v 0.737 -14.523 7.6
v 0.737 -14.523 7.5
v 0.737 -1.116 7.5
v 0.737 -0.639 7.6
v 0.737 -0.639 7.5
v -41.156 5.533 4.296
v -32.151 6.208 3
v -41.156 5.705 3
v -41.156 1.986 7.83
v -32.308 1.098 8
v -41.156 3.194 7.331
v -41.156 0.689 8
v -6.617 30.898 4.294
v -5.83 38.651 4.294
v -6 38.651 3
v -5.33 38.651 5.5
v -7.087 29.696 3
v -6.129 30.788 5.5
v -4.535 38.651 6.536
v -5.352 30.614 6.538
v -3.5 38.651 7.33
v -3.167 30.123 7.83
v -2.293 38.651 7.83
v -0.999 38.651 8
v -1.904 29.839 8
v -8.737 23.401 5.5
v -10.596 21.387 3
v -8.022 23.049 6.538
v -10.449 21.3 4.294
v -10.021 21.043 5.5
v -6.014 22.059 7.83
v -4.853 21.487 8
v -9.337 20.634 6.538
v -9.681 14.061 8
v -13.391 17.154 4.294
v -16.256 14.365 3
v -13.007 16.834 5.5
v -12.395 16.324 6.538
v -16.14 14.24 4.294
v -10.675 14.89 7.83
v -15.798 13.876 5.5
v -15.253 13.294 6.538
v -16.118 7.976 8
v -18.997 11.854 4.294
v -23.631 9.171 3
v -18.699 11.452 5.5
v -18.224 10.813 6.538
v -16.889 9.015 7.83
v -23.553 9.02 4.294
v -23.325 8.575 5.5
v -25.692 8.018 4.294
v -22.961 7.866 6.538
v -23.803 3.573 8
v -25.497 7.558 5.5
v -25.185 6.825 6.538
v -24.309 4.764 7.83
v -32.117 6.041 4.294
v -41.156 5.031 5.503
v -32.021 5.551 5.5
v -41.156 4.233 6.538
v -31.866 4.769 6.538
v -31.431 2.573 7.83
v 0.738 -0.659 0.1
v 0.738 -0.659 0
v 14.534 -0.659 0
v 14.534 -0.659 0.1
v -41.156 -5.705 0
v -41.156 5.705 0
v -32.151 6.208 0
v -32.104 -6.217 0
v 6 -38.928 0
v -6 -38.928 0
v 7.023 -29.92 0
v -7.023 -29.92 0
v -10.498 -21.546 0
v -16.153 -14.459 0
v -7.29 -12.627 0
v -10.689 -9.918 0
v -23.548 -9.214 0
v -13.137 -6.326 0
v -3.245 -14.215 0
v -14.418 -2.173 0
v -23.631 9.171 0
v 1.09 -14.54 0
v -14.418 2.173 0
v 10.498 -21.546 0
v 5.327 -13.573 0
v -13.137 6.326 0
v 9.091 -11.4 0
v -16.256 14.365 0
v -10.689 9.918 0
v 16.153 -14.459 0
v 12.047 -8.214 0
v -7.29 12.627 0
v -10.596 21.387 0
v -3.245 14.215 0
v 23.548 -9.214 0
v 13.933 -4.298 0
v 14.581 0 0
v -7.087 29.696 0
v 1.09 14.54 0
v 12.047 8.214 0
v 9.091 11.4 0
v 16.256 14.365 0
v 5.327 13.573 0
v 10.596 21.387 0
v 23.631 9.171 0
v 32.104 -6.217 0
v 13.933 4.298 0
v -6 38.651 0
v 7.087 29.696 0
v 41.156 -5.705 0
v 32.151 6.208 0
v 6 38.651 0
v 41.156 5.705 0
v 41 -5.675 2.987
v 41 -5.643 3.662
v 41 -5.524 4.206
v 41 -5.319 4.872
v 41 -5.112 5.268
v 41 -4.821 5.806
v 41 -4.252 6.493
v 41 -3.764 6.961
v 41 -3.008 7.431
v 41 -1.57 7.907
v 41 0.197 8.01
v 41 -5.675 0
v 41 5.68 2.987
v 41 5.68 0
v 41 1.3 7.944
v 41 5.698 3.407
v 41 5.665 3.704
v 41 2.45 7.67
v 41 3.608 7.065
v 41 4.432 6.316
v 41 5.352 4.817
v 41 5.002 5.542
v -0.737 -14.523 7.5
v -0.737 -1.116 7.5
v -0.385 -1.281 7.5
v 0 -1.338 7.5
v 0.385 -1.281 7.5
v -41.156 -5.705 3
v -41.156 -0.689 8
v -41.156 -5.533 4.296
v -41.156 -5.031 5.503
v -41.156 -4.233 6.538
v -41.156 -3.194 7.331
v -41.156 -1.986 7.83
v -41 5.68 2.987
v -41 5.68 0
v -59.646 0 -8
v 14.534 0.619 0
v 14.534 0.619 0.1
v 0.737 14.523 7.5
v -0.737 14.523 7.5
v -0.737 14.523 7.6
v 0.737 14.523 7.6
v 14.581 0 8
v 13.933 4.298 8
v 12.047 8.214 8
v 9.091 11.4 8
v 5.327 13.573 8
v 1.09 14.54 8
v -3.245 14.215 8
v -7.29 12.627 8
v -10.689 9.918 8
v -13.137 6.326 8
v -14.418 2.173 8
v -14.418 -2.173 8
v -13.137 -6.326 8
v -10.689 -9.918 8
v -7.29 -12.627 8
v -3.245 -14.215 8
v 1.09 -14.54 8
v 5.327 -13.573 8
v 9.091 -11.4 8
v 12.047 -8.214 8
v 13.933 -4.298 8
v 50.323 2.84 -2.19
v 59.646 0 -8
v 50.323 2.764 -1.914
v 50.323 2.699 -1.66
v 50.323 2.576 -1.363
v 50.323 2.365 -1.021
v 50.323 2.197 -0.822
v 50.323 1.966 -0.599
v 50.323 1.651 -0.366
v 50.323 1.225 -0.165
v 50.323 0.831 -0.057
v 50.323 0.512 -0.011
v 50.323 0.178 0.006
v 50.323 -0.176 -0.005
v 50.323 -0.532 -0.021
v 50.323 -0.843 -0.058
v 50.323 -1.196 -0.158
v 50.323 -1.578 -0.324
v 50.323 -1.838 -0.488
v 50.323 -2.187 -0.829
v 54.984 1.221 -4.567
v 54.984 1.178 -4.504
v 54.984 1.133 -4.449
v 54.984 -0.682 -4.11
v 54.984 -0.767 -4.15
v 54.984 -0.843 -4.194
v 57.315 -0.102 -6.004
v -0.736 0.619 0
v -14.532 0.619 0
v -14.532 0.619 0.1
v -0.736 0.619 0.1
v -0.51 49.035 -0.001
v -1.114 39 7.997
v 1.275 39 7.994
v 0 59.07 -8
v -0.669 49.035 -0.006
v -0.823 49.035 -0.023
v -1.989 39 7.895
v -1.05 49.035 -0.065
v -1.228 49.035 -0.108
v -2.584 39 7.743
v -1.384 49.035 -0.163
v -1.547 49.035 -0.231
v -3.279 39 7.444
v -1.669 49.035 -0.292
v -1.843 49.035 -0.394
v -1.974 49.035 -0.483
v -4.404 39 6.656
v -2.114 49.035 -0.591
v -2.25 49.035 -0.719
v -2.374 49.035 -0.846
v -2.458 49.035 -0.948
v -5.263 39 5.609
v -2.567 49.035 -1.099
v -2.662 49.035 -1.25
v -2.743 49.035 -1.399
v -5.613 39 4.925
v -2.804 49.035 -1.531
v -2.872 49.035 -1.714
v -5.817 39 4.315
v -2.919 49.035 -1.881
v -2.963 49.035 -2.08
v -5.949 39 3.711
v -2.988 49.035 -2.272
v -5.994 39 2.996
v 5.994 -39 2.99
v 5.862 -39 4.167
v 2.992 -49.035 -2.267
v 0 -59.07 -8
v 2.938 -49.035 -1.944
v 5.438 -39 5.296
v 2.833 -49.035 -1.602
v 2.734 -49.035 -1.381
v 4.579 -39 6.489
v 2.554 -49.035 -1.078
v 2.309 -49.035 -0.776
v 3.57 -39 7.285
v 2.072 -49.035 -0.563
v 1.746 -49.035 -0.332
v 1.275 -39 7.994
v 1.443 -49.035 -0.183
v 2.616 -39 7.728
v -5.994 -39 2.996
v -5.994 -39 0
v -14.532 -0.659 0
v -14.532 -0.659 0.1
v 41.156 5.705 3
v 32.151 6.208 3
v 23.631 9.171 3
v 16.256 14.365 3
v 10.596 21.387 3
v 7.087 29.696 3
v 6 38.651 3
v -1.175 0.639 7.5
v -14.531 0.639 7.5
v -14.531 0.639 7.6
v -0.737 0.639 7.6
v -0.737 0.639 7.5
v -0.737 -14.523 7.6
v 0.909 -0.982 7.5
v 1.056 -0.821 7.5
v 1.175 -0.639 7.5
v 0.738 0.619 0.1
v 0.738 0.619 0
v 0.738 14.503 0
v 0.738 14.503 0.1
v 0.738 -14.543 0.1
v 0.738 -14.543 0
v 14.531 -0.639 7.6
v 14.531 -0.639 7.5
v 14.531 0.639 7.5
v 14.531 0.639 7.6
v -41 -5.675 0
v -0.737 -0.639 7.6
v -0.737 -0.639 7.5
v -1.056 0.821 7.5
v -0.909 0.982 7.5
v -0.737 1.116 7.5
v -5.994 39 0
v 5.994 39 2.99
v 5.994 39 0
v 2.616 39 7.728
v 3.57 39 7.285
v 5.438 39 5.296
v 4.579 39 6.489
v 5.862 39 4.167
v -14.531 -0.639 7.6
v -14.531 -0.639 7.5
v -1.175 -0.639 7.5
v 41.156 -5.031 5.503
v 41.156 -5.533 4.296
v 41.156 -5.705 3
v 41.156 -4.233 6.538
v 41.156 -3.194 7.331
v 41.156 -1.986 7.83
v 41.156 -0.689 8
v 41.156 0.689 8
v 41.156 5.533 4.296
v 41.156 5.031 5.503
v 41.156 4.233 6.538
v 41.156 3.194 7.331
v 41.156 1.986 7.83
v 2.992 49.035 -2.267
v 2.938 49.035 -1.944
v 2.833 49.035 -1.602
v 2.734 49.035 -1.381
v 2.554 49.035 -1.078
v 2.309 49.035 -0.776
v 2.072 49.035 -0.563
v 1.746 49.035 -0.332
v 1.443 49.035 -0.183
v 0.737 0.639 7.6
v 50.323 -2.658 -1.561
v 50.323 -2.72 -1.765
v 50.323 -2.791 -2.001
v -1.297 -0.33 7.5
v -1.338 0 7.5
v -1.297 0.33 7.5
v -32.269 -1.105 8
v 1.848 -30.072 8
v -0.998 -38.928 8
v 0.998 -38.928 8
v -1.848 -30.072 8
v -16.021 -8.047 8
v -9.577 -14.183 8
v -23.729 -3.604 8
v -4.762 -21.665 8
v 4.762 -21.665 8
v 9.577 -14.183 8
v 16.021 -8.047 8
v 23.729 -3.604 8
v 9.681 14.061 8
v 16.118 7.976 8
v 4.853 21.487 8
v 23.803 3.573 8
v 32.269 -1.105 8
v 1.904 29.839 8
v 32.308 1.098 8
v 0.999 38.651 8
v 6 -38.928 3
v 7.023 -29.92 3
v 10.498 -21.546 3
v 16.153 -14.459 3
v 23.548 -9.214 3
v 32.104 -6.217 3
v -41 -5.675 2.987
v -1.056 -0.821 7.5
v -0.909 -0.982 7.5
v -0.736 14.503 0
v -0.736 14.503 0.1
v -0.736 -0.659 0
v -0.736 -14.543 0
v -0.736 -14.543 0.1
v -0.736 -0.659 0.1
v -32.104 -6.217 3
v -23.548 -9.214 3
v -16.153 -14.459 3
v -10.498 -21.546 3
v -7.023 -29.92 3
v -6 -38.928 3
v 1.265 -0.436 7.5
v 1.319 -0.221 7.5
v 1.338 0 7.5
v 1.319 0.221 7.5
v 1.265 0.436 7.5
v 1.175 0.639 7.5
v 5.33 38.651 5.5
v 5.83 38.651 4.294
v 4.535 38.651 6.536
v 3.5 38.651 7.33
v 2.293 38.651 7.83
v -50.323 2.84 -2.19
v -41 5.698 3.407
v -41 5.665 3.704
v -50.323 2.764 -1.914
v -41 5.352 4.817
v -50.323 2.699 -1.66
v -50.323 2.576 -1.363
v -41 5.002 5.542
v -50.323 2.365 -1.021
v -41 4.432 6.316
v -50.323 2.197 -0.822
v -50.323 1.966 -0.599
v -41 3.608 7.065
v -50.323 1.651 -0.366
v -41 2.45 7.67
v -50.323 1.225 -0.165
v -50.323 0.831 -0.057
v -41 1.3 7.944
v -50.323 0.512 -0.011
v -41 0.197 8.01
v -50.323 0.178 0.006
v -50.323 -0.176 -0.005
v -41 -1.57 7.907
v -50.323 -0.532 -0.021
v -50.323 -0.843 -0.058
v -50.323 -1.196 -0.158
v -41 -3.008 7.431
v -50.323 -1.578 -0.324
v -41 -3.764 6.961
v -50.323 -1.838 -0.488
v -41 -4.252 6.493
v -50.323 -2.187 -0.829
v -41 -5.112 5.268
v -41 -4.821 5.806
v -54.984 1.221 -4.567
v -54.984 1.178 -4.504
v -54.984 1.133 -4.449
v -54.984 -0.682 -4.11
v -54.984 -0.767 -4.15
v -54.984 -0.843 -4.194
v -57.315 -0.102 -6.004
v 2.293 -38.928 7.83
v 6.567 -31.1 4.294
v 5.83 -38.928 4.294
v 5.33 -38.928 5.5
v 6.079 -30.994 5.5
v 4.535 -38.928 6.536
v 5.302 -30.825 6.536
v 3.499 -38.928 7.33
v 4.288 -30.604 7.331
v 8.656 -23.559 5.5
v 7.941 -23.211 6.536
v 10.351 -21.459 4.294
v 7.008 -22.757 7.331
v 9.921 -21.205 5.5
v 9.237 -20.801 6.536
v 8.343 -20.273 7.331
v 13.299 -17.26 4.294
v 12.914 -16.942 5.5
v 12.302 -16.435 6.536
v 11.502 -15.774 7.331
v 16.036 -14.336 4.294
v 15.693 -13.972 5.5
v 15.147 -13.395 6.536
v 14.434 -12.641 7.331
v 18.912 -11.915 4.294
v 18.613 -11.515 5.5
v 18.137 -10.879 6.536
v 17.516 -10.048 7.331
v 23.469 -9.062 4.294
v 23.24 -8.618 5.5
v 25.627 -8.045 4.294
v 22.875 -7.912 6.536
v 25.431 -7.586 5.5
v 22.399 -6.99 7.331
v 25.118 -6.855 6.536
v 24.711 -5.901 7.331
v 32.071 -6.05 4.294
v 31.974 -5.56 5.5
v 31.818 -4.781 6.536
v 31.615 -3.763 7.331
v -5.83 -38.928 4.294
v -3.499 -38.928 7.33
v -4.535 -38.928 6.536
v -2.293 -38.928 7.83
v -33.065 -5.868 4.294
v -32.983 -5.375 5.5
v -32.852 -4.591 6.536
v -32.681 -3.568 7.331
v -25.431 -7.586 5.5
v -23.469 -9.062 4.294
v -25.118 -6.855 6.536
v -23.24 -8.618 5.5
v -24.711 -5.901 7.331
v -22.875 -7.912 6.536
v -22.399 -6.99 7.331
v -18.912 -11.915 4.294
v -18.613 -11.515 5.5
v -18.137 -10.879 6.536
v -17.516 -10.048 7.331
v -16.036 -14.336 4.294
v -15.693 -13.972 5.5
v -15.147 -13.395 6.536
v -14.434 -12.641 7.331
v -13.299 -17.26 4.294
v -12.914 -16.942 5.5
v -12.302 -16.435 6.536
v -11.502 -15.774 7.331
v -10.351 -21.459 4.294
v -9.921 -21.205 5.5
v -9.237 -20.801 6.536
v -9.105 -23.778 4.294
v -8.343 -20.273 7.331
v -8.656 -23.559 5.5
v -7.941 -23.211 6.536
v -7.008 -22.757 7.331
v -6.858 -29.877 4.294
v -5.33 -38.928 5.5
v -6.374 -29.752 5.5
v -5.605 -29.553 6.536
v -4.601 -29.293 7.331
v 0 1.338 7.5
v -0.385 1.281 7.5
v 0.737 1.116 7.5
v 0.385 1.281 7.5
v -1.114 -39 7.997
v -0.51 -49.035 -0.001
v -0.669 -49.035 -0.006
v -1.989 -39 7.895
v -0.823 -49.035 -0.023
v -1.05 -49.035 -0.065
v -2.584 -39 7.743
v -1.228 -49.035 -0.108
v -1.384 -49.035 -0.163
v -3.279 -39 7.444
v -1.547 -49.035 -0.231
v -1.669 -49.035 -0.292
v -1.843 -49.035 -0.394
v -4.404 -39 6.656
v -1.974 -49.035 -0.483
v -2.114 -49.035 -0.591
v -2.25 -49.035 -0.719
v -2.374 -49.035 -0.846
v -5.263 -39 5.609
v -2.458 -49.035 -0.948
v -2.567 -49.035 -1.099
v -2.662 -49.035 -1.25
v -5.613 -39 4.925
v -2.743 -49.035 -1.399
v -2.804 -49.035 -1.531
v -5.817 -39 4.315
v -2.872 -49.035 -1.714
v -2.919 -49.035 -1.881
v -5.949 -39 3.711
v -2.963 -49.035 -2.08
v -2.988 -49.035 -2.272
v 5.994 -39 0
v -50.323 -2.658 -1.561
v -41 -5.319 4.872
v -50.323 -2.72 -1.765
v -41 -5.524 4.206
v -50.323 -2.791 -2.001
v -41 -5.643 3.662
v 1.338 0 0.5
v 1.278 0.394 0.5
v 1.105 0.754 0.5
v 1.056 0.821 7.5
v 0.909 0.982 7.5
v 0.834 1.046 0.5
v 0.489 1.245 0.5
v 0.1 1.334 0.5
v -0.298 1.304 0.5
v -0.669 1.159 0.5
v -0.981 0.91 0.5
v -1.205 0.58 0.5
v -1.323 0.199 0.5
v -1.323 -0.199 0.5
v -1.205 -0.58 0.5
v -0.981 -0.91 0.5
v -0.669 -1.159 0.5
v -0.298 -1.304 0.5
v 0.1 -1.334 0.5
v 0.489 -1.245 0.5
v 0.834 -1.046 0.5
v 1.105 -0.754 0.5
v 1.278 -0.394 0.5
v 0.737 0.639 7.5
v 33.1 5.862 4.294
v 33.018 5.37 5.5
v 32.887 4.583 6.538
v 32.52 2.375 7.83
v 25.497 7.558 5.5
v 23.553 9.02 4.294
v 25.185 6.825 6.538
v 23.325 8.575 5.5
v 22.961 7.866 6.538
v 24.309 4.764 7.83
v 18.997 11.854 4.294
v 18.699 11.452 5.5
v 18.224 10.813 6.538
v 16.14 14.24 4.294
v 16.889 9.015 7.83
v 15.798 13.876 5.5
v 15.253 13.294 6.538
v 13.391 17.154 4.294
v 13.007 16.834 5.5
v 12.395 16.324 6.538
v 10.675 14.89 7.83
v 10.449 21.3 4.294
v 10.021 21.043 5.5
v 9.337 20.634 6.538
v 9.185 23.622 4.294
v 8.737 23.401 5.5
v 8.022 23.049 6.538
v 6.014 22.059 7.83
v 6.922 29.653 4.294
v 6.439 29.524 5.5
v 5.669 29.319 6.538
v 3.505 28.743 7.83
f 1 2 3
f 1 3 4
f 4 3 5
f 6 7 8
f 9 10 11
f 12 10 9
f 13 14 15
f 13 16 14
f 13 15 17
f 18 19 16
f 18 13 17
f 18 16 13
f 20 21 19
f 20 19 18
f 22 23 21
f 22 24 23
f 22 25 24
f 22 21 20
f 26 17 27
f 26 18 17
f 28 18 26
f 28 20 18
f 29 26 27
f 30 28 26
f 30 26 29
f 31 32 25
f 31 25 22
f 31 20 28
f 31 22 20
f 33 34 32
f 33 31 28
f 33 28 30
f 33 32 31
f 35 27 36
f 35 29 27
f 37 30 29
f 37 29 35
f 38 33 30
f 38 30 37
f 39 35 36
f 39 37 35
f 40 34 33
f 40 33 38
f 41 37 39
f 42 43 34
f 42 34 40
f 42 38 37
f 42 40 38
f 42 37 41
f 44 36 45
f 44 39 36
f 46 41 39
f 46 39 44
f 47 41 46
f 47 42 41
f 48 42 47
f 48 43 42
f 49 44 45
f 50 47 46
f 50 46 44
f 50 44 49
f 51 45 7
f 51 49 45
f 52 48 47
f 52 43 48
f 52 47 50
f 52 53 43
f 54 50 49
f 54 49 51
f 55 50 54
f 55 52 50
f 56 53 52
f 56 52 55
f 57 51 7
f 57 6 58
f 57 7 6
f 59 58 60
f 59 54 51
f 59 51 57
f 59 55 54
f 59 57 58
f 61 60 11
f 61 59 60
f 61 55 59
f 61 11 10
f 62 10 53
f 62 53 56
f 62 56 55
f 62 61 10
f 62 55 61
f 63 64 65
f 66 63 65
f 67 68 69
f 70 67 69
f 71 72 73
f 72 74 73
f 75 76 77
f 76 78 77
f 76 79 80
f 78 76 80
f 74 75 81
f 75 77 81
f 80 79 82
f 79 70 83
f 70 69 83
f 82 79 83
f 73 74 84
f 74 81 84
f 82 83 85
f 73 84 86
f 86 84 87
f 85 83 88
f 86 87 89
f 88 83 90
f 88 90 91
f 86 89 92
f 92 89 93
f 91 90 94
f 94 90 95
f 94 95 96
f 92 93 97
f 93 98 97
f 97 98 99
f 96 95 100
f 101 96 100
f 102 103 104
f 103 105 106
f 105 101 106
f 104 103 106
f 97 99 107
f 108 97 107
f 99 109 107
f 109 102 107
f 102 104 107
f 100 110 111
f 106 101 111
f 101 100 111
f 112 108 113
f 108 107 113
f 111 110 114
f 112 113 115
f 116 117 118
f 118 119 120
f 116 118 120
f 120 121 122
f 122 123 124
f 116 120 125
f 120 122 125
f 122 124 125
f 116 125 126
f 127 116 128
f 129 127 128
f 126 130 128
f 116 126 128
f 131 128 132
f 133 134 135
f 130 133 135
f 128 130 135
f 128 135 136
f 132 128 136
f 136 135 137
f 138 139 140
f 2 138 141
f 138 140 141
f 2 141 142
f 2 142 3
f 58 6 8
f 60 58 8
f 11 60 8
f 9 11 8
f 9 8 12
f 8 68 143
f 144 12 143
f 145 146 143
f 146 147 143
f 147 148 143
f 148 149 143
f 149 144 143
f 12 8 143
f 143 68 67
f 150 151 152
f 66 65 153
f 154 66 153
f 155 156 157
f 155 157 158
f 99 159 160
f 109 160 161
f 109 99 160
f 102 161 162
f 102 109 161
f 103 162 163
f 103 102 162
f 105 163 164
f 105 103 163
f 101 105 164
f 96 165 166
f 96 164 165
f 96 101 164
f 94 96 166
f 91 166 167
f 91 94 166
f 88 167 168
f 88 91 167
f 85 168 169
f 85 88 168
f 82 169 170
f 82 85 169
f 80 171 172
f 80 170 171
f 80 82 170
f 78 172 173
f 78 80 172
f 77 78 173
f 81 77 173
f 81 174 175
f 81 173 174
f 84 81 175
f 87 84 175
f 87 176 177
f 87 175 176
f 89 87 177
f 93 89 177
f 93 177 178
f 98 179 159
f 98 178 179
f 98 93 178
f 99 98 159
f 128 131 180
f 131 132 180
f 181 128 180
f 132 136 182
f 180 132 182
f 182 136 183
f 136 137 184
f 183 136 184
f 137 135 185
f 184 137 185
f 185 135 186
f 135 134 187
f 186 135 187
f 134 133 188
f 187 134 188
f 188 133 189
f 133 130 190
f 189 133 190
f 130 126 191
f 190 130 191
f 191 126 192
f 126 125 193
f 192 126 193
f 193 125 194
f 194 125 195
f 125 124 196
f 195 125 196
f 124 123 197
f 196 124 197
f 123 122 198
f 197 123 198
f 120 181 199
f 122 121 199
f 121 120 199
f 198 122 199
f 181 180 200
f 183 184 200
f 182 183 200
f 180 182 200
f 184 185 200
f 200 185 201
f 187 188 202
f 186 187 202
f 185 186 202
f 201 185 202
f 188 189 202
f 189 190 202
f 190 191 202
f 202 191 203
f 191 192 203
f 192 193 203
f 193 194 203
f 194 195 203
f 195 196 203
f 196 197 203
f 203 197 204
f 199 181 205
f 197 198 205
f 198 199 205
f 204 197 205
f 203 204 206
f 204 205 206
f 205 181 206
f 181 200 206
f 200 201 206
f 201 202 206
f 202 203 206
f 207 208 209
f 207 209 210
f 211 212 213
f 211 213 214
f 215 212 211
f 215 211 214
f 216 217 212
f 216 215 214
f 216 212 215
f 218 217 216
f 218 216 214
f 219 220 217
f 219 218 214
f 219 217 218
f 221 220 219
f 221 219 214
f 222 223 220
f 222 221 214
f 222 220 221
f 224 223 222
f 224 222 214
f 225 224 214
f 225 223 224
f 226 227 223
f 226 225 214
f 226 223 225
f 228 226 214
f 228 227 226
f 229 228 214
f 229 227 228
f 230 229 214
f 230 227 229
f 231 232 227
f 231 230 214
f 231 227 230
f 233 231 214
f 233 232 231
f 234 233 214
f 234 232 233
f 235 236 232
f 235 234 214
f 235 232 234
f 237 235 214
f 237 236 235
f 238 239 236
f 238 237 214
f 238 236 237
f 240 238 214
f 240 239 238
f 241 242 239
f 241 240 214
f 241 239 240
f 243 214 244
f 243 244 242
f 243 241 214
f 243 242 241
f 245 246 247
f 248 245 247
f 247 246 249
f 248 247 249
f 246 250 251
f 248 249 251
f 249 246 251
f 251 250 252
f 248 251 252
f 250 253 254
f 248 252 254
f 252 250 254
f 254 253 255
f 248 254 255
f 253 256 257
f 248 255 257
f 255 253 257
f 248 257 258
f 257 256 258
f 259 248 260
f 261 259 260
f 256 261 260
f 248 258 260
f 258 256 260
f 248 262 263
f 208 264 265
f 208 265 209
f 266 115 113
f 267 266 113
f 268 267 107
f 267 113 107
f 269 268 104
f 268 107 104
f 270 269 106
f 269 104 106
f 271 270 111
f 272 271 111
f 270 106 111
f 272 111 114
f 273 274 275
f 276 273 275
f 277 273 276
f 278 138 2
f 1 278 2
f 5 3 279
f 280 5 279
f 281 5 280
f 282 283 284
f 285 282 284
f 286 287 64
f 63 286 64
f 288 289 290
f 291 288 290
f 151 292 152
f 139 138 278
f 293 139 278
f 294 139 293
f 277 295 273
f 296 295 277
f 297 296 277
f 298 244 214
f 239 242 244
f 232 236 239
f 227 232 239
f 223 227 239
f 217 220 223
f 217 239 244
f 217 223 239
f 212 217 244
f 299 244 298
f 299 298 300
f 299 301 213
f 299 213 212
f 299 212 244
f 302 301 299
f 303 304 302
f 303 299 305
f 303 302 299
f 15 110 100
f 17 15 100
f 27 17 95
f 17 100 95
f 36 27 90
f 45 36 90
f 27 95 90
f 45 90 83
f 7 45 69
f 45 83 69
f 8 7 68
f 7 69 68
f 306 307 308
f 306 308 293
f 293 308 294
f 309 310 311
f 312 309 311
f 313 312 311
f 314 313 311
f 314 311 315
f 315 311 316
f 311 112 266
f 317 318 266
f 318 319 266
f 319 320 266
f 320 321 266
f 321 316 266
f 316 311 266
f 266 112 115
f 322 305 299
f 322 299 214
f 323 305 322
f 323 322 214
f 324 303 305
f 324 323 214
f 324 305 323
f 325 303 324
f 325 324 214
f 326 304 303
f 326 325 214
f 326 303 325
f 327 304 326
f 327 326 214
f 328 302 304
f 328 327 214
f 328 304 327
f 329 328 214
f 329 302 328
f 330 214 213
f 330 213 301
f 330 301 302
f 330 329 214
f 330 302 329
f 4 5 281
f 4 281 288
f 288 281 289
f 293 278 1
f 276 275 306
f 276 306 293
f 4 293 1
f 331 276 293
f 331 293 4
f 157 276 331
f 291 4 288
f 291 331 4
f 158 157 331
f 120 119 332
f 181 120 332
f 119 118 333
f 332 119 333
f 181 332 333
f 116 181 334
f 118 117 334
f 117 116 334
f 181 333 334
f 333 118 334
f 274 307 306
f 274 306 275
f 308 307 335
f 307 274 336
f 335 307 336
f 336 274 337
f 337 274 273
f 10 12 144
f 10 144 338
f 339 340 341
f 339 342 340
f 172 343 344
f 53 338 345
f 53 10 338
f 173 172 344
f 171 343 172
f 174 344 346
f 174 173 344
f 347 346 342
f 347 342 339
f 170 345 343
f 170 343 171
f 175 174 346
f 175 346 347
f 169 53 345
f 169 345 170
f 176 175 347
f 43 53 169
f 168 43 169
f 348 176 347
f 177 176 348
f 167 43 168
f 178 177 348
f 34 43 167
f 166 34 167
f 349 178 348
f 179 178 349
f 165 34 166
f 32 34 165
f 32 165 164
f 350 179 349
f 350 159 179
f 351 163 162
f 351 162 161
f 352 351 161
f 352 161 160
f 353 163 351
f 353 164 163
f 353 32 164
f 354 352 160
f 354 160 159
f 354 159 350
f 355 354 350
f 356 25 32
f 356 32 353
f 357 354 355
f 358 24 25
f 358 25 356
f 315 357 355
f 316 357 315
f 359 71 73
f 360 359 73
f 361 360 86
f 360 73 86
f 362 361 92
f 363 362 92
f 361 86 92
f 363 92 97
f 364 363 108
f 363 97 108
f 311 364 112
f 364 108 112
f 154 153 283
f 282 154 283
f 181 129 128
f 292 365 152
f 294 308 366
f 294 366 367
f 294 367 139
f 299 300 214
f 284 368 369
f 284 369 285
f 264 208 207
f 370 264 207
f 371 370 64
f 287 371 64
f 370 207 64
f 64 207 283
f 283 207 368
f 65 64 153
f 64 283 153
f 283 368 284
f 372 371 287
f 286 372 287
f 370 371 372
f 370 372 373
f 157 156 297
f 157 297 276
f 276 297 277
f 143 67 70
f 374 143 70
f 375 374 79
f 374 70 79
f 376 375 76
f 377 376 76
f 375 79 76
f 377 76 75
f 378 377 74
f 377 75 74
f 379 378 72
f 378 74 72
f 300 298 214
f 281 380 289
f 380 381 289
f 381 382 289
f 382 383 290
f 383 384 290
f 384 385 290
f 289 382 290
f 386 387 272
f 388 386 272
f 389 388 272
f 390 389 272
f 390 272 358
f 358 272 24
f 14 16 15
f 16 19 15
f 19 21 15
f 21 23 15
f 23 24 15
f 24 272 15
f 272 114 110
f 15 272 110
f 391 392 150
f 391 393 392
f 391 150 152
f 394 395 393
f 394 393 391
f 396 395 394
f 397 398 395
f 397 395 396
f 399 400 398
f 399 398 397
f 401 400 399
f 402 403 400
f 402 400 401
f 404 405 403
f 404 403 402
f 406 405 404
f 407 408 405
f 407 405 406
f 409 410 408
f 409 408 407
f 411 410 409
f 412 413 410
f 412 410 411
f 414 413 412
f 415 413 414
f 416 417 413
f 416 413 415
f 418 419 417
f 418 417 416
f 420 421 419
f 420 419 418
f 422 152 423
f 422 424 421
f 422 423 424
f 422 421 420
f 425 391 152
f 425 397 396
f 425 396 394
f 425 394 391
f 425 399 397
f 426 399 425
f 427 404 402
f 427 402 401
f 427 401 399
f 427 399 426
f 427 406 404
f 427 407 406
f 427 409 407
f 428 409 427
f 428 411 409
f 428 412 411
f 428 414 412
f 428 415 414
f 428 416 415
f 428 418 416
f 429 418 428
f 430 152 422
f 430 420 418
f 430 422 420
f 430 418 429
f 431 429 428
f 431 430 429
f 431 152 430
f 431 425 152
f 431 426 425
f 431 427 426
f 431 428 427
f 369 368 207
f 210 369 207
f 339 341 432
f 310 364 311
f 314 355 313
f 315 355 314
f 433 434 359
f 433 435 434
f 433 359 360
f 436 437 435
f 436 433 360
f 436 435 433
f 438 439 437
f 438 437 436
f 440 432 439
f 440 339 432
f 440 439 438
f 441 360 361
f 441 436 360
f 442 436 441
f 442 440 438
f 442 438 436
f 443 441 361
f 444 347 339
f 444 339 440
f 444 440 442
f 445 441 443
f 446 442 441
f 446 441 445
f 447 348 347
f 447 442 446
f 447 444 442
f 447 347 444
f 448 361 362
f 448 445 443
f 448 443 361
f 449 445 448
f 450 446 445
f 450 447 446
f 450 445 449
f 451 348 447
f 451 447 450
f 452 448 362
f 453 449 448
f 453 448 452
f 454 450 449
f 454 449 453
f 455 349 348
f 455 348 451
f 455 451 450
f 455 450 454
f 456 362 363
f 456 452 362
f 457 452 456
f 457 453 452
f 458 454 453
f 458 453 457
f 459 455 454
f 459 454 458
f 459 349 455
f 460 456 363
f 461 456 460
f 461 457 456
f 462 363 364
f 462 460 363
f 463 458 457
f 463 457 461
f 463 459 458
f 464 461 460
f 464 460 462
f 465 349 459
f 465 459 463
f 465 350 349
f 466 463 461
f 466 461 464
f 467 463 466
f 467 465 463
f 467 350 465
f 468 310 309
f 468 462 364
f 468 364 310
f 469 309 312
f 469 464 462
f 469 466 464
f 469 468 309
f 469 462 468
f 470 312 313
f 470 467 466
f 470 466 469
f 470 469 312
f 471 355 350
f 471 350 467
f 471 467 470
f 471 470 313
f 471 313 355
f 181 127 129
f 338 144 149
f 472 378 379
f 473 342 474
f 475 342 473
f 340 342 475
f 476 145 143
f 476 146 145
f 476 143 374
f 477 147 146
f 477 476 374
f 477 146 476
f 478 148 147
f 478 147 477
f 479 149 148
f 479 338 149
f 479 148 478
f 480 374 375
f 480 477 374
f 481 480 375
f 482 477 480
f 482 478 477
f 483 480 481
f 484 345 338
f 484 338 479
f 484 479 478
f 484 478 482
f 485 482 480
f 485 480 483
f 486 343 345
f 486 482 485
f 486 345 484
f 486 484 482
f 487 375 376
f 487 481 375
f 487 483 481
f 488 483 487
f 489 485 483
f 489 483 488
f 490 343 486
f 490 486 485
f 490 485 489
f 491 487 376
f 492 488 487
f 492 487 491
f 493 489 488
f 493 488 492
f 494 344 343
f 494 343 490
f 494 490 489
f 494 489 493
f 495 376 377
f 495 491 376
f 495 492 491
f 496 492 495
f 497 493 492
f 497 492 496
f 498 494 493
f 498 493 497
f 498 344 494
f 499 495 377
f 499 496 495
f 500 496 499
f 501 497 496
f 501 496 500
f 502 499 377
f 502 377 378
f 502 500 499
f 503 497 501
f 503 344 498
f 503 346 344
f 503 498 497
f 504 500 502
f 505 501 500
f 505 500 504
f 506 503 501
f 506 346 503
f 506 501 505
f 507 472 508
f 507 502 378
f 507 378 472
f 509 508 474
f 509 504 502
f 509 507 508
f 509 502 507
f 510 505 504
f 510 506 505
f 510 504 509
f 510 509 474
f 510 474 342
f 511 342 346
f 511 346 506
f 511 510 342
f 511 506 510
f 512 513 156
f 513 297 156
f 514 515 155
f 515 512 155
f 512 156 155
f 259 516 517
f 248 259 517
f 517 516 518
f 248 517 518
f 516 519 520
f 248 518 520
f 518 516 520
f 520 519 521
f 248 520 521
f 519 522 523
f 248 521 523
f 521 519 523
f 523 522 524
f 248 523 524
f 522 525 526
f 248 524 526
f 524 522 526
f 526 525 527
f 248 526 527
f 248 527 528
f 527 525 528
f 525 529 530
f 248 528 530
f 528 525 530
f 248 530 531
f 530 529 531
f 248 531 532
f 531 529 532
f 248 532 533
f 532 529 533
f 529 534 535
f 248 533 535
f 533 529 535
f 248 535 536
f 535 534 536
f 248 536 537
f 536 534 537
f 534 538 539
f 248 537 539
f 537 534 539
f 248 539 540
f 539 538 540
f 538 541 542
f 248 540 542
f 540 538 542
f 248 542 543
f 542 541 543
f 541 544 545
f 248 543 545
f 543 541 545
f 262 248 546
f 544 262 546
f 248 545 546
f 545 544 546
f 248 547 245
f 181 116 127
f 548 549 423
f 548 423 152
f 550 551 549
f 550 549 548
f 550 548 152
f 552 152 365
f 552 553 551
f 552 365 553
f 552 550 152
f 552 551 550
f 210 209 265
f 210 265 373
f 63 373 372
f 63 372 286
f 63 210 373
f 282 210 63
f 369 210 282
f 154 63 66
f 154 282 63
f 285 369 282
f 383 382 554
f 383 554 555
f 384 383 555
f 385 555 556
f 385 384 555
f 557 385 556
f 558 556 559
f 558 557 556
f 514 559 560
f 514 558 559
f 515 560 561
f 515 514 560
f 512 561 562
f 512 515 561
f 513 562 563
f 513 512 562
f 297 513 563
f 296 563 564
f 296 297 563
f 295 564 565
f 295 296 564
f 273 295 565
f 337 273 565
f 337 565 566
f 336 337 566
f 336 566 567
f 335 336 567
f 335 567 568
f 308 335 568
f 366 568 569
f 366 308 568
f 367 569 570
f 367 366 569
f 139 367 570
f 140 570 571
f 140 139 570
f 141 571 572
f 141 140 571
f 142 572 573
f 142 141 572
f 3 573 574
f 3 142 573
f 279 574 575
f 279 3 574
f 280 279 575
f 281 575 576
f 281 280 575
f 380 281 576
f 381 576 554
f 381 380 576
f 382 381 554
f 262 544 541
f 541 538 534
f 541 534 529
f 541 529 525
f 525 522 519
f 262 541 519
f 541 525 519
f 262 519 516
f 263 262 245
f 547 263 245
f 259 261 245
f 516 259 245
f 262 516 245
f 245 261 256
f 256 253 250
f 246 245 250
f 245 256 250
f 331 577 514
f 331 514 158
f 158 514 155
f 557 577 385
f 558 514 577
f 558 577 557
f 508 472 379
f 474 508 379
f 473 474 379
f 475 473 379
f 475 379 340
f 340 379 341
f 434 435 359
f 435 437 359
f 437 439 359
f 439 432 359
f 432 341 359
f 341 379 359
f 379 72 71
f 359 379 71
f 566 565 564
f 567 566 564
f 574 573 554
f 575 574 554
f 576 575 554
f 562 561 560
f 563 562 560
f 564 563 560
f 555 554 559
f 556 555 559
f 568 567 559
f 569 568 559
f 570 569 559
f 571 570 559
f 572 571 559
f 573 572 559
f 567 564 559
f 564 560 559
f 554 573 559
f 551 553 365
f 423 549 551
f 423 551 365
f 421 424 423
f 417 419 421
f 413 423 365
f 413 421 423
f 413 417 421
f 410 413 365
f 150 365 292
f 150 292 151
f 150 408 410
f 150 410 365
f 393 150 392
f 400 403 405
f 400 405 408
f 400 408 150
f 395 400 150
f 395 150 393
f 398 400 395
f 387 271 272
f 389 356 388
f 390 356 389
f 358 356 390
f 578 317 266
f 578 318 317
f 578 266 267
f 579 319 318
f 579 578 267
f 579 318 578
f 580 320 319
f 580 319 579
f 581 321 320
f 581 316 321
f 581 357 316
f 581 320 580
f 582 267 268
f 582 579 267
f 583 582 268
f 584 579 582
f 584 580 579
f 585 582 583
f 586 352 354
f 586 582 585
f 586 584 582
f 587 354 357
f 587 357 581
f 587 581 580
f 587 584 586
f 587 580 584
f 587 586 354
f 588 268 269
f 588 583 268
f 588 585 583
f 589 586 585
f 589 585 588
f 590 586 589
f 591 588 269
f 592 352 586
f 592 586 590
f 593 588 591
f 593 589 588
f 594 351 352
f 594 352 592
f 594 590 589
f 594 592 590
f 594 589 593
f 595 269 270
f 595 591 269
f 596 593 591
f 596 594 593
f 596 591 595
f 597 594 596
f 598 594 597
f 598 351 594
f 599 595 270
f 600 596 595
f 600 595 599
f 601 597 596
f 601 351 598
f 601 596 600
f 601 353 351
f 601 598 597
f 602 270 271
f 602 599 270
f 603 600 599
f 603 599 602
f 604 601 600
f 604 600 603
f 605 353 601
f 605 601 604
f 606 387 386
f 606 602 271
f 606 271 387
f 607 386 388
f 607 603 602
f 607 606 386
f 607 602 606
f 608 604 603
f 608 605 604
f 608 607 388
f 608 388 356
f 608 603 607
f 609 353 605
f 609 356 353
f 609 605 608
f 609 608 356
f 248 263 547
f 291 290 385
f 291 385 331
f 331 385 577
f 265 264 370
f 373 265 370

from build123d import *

# Parameters (mm, degrees)
F1_DEPTH       = 8
F5_R           = 5
F10_R          = 14.5809762942
F11_DEPTH      = 25
F11_DEPTH_BACK = 25
F17_R          = 1.3377868925
F18_DEPTH      = 7
F19_W          = 13.7937454856
F19_H          = 1.2778390591
F19_W_2        = 1.4747540699
F19_H_2        = 13.8842168999
F20_DEPTH      = 0.1
F21_W          = 13.7960873644
F21_H          = 1.2778390591
F21_W_2        = 1.4737510647
F21_H_2        = 13.8842168999
F22_DEPTH      = 0.1


# Not quite as in the source:
# - a feature names something its author has since deleted; it is built from what else it names


with BuildPart() as f1:
    # F0 (on Top) → F1 (new body)
    with BuildSketch(Plane.XY):
        with BuildLine():
            Line((-6, -38.9283647568), (0, -38.9283647568))
            Line((0, -38.9283647568), (0, 38.6506099872))
            Line((0, 38.6506099872), (-6, 38.6506099872))
            ThreePointArc((-6, 38.6506099872), (-16.2563291401, 14.3645411148), (-41.1563329399, 5.7045619305))
            Line((-41.1563329399, 5.7045619305), (-41.1563329399, -5.7045619305))
            ThreePointArc((-41.1563329399, -5.7045619305), (-16.1530460363, -14.4594456673), (-6, -38.9283647568))
        make_face()
        with BuildLine():
            Line((0, 38.6506099872), (0, -38.9283647568))
            Line((0, -38.9283647568), (6, -38.9283647568))
            ThreePointArc((6, -38.9283647568), (16.1530460363, -14.4594456673), (41.1563329399, -5.7045619305))
            Line((41.1563329399, -5.7045619305), (41.1563329399, 5.7045619305))
            ThreePointArc((41.1563329399, 5.7045619305), (16.2563291401, 14.3645411148), (6, 38.6506099872))
            Line((6, 38.6506099872), (0, 38.6506099872))
        make_face()
    extrude(amount=F1_DEPTH)

    # F5
    f5_edges = [f1.edges().sort_by_distance(p)[0] for p in [
        (-16.256329, 14.364541, 8),
        (-16.153046, -14.459446, 8),
        (16.256329, 14.364541, 8),
        (16.153046, -14.459446, 8),
    ]]
    fillet(f5_edges, radius=F5_R)

    # F10 (on Top) → F11 (cut, two sides)
    with BuildSketch(Plane.XY) as f11_sk:
        Circle(F10_R)
    extrude(amount=F11_DEPTH, mode=Mode.SUBTRACT)
    extrude(f11_sk.sketch, amount=-F11_DEPTH_BACK, mode=Mode.SUBTRACT)


with BuildPart() as f7:
    # F6 (on offset) → F7 section 0
    with BuildSketch(Plane.YZ.offset(41), mode=Mode.PRIVATE) as f7_s0:
        with BuildLine():
            Line((-5.6745633483, 2.9871875886), (-5.6745633483, 0))
            Line((-5.6745633483, 0), (5.680473987, 0))
            Line((5.680473987, 0), (5.680473987, 2.9871875886))
            add(Edge.make_bspline(
                [(5.680473987, 2.9871875886), (5.6961226516, 3.2023706582), (5.7266473384, 3.6221122778), (5.5095213329, 4.1705030453), (5.4189197792, 4.6854509336), (5.1653598653, 5.2792204603), (4.8671516526, 5.7675621219), (4.595492144, 6.1533733509), (4.1731740718, 6.5852177534), (3.6655723563, 7.0548230975), (2.9133413088, 7.5120975715), (2.0228145415, 7.8302873353), (1.3427473514, 7.9431760952), (0.7054569456, 8.0192411539), (-0.0052608695, 8.0094879795), (-0.6967338383, 7.9690324076), (-1.4140359274, 7.9528726283), (-1.9769670867, 7.8166335645), (-2.831114124, 7.5524617191), (-3.4441109512, 7.1858192873), (-3.8874893713, 6.884099922), (-4.2378609304, 6.5250253974), (-4.5111891113, 6.161764951), (-4.8527214432, 5.8131409825), (-5.022034993, 5.4567339521), (-5.1115825772, 5.2682352252)],
                knots=[0, 0, 0, 0, 0.0434863796, 0.0848256485, 0.1243592318, 0.1681716105, 0.2094747234, 0.2467932906, 0.2887889342, 0.3342469985, 0.3856749903, 0.4388627149, 0.4840956225, 0.5275602038, 0.5734684376, 0.6194034944, 0.6650441984, 0.7068937948, 0.7583696913, 0.8048710099, 0.8445998947, 0.882945876, 0.9196464802, 0.9575021397, 1, 1, 1, 1], degree=3))
            add(Edge.make_bspline(
                [(-5.1115825772, 5.2682352252), (-5.1876140748, 5.1405504387), (-5.3386246291, 4.8869483001), (-5.4298509883, 4.4603913926), (-5.6042277019, 4.0039908588), (-5.6752105609, 3.4265059116), (-5.6747687115, 3.1265850958), (-5.6745633483, 2.9871875886)],
                knots=[0, 0, 0, 0, 0.1927235014, 0.3827792915, 0.5867141249, 0.8079125632, 1, 1, 1, 1], degree=3))
        make_face()
    loft([Vertex(59.6456676722, 0, -8), f7_s0.sketch])


with BuildPart() as f9_1:
    # F9: instance of F7
    add(f7.part.mirror(Plane.YZ))


with BuildPart() as f15:
    # F13 (on offset) → F15 section 0
    with BuildSketch(Plane.XZ.offset(39), mode=Mode.PRIVATE) as f15_s0:
        with BuildLine():
            Line((-5.9944099137, 2.9958747894), (-5.9944099137, 0))
            Line((-5.9944099137, 0), (5.9937159531, 0))
            Line((5.9937159531, 0), (5.9937159531, 2.9904348776))
            add(Edge.make_bspline(
                [(1.2747923611, 7.9939775169), (1.4824839899, 7.9738728024), (1.9417054276, 7.9294198027), (2.9066530946, 7.6548688525), (3.4852965721, 7.3598152646), (4.1590321718, 6.8772754783), (4.6271761756, 6.4649031497), (5.123048457, 5.8613971166), (5.475565689, 5.2424580454), (5.6755920242, 4.8013575587), (5.892310974, 4.1137787102), (5.9984549521, 3.4762948253), (5.9952085186, 3.1434582903), (5.9937159531, 2.9904348776)],
                knots=[0, 0, 0, 0, 0.0901408322, 0.1993079971, 0.2897259787, 0.3881183325, 0.4758975639, 0.573044131, 0.6653592716, 0.7420254803, 0.835035104, 0.9241564892, 1, 1, 1, 1], degree=3))
            add(Edge.make_bspline(
                [(-5.9944099137, 2.9958747894), (-5.9950314515, 3.0479435495), (-5.9963679382, 3.1599064882), (-5.9858142016, 3.3813314), (-5.9646795578, 3.5305374515), (-5.9516586953, 3.7341965228), (-5.9018897214, 3.9408938339), (-5.8803328007, 4.1073797979), (-5.7960635617, 4.3768885226), (-5.74913918, 4.5723993195), (-5.6203314712, 4.9297471084), (-5.4836570267, 5.1988546444), (-5.4592090914, 5.270703893), (-5.3537695157, 5.4444498536), (-5.295526214, 5.5532759218), (-5.2180785314, 5.6862072163), (-5.0492178435, 5.9193146032), (-4.961360939, 6.0561793869), (-4.8747004771, 6.1501514649), (-4.7780479662, 6.2676655241), (-4.7121245787, 6.3575768778), (-4.4969781008, 6.5644294278), (-4.293631571, 6.7654278403), (-4.1636212216, 6.8683144457), (-3.9538061718, 7.0370130479), (-3.7360017211, 7.1784048192), (-3.6369210607, 7.2467137809), (-3.4014865011, 7.3869954226), (-3.2868331685, 7.4397869865), (-3.1681660923, 7.4993179406), (-3.0211153204, 7.5762029169), (-2.9250525886, 7.6095624185), (-2.5706425561, 7.7548356943), (-2.3335590973, 7.8169101439), (-1.8761051772, 7.923622144), (-1.6577938155, 7.9531586472), (-1.3119293852, 7.993050517), (-0.9738346206, 8.002401008), (0.326799832, 7.9975287536), (1.2747923611, 7.9939775169)],
                knots=[0, 0, 0, 0, 0.0225922841, 0.0485799646, 0.0703773601, 0.0953767047, 0.1208450417, 0.1439685284, 0.1728943558, 0.1983584542, 0.2331066781, 0.2631175547, 0.2787030186, 0.3031680151, 0.3230289605, 0.3447420766, 0.3747142758, 0.39730409, 0.4170698345, 0.4382806743, 0.4569453263, 0.4872616232, 0.5172585751, 0.5398068451, 0.5688071761, 0.5968393041, 0.6167877586, 0.645427363, 0.6655976282, 0.6857678614, 0.7078632653, 0.7261916835, 0.7595514909, 0.7890147822, 0.8262060834, 0.8534043783, 0.8844257561, 0.9157614812, 1, 1, 1, 1], degree=3))
        make_face()
    loft([Vertex(0, -59.0698996127, -8), f15_s0.sketch])


with BuildPart() as f16_1:
    # F16: instance of F15
    add(f15.part.mirror(Plane.XZ))


with BuildPart() as f18:
    # F17 (on offset) → F18 (new body)
    with BuildSketch(Plane.XY.offset(7.5)):
        Circle(F17_R)
    extrude(amount=-F18_DEPTH)

    # F19 (on offset) → F20 (join)
    with BuildSketch(Plane.XY.offset(7.5)):
        with Locations((7.6342497778, 0)):
            Rectangle(F19_W, F19_H)
        Rectangle(F19_W_2, F19_H)
        with Locations((0, 7.5810279795)):
            Rectangle(F19_W_2, F19_H_2)
        with Locations((-7.6342497778, 0)):
            Rectangle(F19_W, F19_H)
        with Locations((0, -7.5810279795)):
            Rectangle(F19_W_2, F19_H_2)
    extrude(amount=F20_DEPTH)


with BuildPart() as f22:
    # F21 (on Top) → F22 (new body)
    with BuildSketch(Plane.XY):
        with Locations((7.6360394938, -0.0199771021)):
            Rectangle(F21_W, F21_H)
        with Locations((0.0011202792, -0.0199771021)):
            Rectangle(F21_W_2, F21_H)
        with Locations((0.0011202792, 7.5610508775)):
            Rectangle(F21_W_2, F21_H_2)
        with Locations((-7.6337989354, -0.0199771021)):
            Rectangle(F21_W, F21_H)
        with Locations((0.0011202792, -7.6010050816)):
            Rectangle(F21_W_2, F21_H_2)
    extrude(amount=F22_DEPTH)


solid = Compound([f1.part, f7.part, f9_1.part, f15.part, f16_1.part, f18.part, f22.part])
